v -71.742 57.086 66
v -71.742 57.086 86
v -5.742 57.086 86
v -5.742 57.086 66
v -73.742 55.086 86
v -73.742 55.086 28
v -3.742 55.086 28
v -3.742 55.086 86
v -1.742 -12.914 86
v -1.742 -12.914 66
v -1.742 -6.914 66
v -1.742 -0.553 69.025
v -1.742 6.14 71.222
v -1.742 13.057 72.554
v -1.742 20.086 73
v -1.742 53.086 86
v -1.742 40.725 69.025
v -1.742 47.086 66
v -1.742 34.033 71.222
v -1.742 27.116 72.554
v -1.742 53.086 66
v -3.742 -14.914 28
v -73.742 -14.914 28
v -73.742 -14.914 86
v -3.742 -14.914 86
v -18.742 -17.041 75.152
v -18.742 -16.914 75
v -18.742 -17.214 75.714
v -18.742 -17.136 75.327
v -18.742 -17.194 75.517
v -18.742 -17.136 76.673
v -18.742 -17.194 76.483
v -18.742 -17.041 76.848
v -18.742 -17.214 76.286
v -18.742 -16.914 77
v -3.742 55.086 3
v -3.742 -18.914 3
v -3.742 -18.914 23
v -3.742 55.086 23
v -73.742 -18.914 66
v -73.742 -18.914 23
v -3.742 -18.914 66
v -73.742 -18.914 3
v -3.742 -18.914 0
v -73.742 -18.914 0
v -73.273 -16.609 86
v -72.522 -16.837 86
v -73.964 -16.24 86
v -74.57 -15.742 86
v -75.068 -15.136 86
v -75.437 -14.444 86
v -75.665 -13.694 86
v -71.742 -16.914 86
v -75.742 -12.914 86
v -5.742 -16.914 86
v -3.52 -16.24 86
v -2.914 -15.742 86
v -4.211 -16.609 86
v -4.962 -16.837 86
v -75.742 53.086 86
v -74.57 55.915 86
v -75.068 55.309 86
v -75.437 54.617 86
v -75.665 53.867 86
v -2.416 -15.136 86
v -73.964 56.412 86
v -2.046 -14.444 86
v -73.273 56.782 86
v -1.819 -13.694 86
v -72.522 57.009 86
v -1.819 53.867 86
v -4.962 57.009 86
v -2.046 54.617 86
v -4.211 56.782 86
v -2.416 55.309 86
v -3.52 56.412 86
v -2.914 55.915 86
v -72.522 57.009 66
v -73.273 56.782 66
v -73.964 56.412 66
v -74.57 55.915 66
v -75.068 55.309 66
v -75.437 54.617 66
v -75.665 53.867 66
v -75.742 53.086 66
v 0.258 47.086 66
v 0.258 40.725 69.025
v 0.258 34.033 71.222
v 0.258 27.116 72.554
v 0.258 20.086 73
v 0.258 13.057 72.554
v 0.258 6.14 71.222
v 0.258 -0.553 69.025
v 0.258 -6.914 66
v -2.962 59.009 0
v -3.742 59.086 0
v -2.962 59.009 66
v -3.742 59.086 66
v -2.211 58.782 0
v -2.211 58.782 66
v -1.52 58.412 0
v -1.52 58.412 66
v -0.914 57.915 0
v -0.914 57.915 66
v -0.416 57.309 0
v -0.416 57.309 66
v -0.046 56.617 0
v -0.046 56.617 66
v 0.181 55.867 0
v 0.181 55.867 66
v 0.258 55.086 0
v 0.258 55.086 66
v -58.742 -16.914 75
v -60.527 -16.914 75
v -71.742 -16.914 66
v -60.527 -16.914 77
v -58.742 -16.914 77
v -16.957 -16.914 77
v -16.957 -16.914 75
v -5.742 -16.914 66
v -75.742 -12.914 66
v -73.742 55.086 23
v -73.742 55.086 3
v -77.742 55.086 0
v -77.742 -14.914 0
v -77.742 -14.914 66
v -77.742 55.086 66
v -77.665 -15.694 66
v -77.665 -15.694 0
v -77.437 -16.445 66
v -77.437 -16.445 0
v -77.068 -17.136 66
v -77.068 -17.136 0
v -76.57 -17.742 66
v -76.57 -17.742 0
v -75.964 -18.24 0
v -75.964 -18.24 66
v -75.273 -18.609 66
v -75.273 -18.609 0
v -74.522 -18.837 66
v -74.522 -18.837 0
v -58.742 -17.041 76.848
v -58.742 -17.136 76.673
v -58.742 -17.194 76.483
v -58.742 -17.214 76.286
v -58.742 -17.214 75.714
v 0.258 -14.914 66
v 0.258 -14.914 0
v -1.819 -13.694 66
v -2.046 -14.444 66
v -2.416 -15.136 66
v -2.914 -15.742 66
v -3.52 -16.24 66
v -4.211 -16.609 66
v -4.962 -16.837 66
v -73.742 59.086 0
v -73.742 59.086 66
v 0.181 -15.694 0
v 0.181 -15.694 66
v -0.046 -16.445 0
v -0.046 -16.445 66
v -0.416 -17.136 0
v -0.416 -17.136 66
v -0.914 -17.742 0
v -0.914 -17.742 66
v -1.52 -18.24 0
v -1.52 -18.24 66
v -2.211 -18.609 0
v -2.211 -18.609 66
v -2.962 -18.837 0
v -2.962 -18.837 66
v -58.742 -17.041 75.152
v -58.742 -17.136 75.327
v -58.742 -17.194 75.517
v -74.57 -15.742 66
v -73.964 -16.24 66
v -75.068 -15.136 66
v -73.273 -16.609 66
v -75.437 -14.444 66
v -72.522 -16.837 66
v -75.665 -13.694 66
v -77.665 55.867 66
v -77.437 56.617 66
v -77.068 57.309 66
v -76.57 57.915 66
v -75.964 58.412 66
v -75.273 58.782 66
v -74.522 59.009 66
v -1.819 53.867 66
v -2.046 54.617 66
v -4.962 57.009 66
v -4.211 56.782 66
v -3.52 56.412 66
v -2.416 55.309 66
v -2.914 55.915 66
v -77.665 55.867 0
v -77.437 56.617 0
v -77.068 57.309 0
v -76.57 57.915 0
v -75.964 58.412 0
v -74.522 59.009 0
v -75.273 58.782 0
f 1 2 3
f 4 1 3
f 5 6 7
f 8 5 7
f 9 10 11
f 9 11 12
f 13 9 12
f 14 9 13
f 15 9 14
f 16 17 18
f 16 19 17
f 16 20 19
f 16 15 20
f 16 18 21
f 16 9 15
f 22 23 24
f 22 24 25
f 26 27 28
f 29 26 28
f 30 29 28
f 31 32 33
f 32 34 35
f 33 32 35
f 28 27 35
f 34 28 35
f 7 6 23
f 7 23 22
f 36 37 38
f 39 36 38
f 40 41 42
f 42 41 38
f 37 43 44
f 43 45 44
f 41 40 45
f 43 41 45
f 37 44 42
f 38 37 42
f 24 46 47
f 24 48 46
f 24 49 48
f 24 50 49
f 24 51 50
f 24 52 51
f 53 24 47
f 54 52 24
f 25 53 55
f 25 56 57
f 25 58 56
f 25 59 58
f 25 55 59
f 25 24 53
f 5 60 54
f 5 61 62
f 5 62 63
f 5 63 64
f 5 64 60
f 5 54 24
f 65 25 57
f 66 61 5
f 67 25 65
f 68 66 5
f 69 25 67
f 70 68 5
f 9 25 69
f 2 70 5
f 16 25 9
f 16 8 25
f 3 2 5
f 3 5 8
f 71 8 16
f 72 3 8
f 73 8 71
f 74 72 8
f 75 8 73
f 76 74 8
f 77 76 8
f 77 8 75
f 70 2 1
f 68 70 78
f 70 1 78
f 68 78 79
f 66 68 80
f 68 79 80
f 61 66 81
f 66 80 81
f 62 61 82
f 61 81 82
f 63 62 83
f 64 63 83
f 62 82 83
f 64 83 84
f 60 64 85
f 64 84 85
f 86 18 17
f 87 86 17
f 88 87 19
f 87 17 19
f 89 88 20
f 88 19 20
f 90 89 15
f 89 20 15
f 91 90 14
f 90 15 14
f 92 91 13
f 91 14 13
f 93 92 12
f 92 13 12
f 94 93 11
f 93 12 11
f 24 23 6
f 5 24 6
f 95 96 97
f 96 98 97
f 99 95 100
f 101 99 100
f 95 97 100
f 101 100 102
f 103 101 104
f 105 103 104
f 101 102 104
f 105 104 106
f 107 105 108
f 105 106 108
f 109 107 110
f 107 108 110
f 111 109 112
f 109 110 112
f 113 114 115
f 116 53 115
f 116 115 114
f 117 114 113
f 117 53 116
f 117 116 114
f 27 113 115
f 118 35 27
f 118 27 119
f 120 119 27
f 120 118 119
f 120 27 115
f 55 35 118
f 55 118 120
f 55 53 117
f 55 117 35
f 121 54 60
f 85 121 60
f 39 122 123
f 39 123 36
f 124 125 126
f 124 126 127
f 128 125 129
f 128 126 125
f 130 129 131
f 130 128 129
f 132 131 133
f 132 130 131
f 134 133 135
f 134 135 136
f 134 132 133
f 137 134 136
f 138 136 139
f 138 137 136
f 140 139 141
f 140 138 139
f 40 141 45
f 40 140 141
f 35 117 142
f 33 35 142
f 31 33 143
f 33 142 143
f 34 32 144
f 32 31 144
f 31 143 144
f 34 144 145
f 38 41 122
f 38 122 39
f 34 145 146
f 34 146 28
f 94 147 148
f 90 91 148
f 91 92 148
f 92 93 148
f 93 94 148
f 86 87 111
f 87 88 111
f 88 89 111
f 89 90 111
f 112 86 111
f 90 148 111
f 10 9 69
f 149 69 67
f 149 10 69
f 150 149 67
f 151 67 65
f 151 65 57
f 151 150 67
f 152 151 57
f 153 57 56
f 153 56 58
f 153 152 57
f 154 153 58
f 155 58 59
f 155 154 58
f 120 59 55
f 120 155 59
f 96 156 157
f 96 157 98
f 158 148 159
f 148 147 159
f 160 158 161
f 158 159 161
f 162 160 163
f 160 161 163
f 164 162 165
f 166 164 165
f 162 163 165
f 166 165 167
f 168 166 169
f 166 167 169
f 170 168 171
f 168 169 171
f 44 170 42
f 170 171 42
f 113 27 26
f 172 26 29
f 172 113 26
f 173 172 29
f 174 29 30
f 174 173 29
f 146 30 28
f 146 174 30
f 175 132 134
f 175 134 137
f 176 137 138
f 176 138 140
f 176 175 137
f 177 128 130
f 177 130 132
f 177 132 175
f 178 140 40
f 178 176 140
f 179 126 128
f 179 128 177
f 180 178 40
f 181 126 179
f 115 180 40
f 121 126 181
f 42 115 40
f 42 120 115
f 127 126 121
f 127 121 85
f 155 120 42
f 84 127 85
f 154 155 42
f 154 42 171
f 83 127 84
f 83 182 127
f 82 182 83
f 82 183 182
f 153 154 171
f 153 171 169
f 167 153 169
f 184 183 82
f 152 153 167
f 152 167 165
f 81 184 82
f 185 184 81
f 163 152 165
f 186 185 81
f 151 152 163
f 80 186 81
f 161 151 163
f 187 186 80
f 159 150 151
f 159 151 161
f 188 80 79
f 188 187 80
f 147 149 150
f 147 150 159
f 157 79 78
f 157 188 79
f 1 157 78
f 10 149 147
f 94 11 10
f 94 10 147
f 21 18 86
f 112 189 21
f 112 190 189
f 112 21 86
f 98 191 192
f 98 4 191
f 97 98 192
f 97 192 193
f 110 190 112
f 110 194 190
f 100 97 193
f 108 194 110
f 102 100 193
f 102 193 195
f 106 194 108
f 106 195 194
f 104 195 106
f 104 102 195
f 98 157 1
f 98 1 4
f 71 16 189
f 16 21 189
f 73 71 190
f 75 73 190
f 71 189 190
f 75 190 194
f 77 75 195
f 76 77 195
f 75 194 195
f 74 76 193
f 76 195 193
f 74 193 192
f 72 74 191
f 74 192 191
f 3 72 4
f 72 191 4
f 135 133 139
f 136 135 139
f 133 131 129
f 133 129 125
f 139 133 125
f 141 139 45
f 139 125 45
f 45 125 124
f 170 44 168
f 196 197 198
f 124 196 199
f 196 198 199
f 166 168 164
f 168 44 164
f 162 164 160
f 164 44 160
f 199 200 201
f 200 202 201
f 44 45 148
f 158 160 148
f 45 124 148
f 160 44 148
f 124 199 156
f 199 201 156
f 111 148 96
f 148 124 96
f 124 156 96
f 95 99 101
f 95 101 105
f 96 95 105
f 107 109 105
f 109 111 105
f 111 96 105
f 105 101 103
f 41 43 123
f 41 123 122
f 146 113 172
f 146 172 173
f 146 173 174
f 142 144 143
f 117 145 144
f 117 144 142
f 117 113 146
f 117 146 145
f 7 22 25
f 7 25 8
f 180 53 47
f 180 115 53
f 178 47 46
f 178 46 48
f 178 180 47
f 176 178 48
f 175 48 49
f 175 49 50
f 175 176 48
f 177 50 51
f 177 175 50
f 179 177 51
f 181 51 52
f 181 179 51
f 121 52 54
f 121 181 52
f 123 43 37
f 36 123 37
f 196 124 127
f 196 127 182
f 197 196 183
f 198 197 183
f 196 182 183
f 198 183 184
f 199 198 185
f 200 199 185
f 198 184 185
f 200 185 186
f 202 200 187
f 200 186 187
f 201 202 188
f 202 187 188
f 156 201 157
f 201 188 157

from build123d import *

# Parameters (mm, degrees)
F0_W         = 78
F0_H         = 78
F1_DEPTH     = 86
F2_T         = -4
F4_DEPTH     = 24
F3_W         = 70
F3_H         = 20
F5_DEPTH     = 74
F6_W         = 78
F6_H         = 78
F6_W_2       = 74
F6_H_2       = 74
F7_DEPTH     = 20
F9_DEPTH     = 2
F10_R        = 3.99999
F11_R        = 4
F12_W        = 40
F12_H        = 2
F13_DEPTH    = 0.3
F14_T1_DEPTH = 43.5707142143
F15_T1_DEPTH = 43.5707142143


# Not quite as in the source:
# - a fillet or chamfer that OpenCascade refuses, or shapes differently, is made with other operations: its cross-section is extruded or revolved along the edge and cut away or added
# - a fillet or chamfer is up to 0.001 mm smaller than in the source, because OpenCascade refuses the exact size


with BuildPart() as f1:
    # F0 (on Top) → F1 (new body)
    with BuildSketch(Plane.XY):
        with Locations((-38.7419309749, 20.0862393249)):
            Rectangle(F0_W, F0_H)
    extrude(amount=F1_DEPTH)

    # F2
    f2_openings = [f1.faces().sort_by_distance(p)[0] for p in [
        (-38.741931, 20.086239, 86),
    ]]
    offset(amount=F2_T, openings=f2_openings)

    # F4 (add): a face of the model
    f4_faces = [f1.faces().sort_by_distance(p)[0] for p in [
        (-38.7419309749, 20.0862393249, 4),
    ]]
    extrude(f4_faces, amount=F4_DEPTH)

    # F3 (on face) → F5 (cut)
    with BuildSketch(Plane.XZ.offset(18.9137606751)):
        with Locations((-38.7419309749, 13)):
            Rectangle(F3_W, F3_H)
    extrude(amount=-F5_DEPTH, mode=Mode.SUBTRACT)

    # F6 (on face) → F7 (cut)
    with BuildSketch(Plane.XY.offset(86)):
        with Locations((-38.7419309749, 20.0862393249)):
            Rectangle(F6_W, F6_H)
        with Locations((-38.7419309749, 20.0862393249)):
            Rectangle(F6_W_2, F6_H_2, mode=Mode.SUBTRACT)
    extrude(amount=-F7_DEPTH, mode=Mode.SUBTRACT)

    # F8 (on face) → F9 (join)
    with BuildSketch(Plane.YZ.offset(-1.7419309749)):
        with BuildLine():
            Line((-6.9137606751, 66), (47.0862393249, 66))
            ThreePointArc((47.0862393249, 66), (20.0862393249, 73), (-6.9137606751, 66))
        make_face()
    extrude(amount=F9_DEPTH)

    # F10 (radius 4 in the source; OpenCascade refuses exactly that, so slightly less here)
    f10_edges = [f1.edges().sort_by_distance(p)[0] for p in [
        (-77.741931, -18.913761, 33),
        (0.258069, -18.913761, 33),
        (0.258069, 59.086239, 33),
        (-77.741931, 59.086239, 33),
    ]]
    fillet(f10_edges, radius=F10_R)

    # F11
    f11_edges = [f1.edges().sort_by_distance(p)[0] for p in [
        (-1.741931, -16.913761, 76),
        (-1.741931, 57.086239, 76),
        (-75.741931, -16.913761, 76),
        (-75.741931, 57.086239, 76),
    ]]
    fillet(f11_edges, radius=F11_R)

    # F12 (on face) → F13 (join)
    with BuildSketch(Plane.XZ.offset(16.9137606751)):
        with Locations((-38.7419309749, 76)):
            Rectangle(F12_W, F12_H)
    extrude(amount=F13_DEPTH)

    # F14: fillet of radius 1 on 1 edges, made by hand

    # F14_s2 → F14_t1 (cut)
    with BuildSketch(Plane.YZ.offset(-60.527288082)):
        with BuildLine():
            ThreePointArc((-16.9137606751, 77), (-17.1357151208, 76.6731554918), (-17.2137606751, 76.2858571571))
            Line((-17.2137606751, 76.2858571571), (-17.2137606751, 77))
            Line((-17.2137606751, 77), (-16.9137606751, 77))
        make_face()
    extrude(amount=F14_T1_DEPTH, mode=Mode.SUBTRACT)

    # F15: fillet of radius 1 on 1 edges, made by hand

    # F15_s2 → F15_t1 (cut)
    with BuildSketch(Plane.YZ.offset(-60.527288082)):
        with BuildLine():
            ThreePointArc((-16.9137606751, 75), (-17.1357151208, 75.3268445082), (-17.2137606751, 75.7141428429))
            Line((-17.2137606751, 75.7141428429), (-17.2137606751, 75))
            Line((-17.2137606751, 75), (-16.9137606751, 75))
        make_face()
    extrude(amount=F15_T1_DEPTH, mode=Mode.SUBTRACT)


solid = f1.part
